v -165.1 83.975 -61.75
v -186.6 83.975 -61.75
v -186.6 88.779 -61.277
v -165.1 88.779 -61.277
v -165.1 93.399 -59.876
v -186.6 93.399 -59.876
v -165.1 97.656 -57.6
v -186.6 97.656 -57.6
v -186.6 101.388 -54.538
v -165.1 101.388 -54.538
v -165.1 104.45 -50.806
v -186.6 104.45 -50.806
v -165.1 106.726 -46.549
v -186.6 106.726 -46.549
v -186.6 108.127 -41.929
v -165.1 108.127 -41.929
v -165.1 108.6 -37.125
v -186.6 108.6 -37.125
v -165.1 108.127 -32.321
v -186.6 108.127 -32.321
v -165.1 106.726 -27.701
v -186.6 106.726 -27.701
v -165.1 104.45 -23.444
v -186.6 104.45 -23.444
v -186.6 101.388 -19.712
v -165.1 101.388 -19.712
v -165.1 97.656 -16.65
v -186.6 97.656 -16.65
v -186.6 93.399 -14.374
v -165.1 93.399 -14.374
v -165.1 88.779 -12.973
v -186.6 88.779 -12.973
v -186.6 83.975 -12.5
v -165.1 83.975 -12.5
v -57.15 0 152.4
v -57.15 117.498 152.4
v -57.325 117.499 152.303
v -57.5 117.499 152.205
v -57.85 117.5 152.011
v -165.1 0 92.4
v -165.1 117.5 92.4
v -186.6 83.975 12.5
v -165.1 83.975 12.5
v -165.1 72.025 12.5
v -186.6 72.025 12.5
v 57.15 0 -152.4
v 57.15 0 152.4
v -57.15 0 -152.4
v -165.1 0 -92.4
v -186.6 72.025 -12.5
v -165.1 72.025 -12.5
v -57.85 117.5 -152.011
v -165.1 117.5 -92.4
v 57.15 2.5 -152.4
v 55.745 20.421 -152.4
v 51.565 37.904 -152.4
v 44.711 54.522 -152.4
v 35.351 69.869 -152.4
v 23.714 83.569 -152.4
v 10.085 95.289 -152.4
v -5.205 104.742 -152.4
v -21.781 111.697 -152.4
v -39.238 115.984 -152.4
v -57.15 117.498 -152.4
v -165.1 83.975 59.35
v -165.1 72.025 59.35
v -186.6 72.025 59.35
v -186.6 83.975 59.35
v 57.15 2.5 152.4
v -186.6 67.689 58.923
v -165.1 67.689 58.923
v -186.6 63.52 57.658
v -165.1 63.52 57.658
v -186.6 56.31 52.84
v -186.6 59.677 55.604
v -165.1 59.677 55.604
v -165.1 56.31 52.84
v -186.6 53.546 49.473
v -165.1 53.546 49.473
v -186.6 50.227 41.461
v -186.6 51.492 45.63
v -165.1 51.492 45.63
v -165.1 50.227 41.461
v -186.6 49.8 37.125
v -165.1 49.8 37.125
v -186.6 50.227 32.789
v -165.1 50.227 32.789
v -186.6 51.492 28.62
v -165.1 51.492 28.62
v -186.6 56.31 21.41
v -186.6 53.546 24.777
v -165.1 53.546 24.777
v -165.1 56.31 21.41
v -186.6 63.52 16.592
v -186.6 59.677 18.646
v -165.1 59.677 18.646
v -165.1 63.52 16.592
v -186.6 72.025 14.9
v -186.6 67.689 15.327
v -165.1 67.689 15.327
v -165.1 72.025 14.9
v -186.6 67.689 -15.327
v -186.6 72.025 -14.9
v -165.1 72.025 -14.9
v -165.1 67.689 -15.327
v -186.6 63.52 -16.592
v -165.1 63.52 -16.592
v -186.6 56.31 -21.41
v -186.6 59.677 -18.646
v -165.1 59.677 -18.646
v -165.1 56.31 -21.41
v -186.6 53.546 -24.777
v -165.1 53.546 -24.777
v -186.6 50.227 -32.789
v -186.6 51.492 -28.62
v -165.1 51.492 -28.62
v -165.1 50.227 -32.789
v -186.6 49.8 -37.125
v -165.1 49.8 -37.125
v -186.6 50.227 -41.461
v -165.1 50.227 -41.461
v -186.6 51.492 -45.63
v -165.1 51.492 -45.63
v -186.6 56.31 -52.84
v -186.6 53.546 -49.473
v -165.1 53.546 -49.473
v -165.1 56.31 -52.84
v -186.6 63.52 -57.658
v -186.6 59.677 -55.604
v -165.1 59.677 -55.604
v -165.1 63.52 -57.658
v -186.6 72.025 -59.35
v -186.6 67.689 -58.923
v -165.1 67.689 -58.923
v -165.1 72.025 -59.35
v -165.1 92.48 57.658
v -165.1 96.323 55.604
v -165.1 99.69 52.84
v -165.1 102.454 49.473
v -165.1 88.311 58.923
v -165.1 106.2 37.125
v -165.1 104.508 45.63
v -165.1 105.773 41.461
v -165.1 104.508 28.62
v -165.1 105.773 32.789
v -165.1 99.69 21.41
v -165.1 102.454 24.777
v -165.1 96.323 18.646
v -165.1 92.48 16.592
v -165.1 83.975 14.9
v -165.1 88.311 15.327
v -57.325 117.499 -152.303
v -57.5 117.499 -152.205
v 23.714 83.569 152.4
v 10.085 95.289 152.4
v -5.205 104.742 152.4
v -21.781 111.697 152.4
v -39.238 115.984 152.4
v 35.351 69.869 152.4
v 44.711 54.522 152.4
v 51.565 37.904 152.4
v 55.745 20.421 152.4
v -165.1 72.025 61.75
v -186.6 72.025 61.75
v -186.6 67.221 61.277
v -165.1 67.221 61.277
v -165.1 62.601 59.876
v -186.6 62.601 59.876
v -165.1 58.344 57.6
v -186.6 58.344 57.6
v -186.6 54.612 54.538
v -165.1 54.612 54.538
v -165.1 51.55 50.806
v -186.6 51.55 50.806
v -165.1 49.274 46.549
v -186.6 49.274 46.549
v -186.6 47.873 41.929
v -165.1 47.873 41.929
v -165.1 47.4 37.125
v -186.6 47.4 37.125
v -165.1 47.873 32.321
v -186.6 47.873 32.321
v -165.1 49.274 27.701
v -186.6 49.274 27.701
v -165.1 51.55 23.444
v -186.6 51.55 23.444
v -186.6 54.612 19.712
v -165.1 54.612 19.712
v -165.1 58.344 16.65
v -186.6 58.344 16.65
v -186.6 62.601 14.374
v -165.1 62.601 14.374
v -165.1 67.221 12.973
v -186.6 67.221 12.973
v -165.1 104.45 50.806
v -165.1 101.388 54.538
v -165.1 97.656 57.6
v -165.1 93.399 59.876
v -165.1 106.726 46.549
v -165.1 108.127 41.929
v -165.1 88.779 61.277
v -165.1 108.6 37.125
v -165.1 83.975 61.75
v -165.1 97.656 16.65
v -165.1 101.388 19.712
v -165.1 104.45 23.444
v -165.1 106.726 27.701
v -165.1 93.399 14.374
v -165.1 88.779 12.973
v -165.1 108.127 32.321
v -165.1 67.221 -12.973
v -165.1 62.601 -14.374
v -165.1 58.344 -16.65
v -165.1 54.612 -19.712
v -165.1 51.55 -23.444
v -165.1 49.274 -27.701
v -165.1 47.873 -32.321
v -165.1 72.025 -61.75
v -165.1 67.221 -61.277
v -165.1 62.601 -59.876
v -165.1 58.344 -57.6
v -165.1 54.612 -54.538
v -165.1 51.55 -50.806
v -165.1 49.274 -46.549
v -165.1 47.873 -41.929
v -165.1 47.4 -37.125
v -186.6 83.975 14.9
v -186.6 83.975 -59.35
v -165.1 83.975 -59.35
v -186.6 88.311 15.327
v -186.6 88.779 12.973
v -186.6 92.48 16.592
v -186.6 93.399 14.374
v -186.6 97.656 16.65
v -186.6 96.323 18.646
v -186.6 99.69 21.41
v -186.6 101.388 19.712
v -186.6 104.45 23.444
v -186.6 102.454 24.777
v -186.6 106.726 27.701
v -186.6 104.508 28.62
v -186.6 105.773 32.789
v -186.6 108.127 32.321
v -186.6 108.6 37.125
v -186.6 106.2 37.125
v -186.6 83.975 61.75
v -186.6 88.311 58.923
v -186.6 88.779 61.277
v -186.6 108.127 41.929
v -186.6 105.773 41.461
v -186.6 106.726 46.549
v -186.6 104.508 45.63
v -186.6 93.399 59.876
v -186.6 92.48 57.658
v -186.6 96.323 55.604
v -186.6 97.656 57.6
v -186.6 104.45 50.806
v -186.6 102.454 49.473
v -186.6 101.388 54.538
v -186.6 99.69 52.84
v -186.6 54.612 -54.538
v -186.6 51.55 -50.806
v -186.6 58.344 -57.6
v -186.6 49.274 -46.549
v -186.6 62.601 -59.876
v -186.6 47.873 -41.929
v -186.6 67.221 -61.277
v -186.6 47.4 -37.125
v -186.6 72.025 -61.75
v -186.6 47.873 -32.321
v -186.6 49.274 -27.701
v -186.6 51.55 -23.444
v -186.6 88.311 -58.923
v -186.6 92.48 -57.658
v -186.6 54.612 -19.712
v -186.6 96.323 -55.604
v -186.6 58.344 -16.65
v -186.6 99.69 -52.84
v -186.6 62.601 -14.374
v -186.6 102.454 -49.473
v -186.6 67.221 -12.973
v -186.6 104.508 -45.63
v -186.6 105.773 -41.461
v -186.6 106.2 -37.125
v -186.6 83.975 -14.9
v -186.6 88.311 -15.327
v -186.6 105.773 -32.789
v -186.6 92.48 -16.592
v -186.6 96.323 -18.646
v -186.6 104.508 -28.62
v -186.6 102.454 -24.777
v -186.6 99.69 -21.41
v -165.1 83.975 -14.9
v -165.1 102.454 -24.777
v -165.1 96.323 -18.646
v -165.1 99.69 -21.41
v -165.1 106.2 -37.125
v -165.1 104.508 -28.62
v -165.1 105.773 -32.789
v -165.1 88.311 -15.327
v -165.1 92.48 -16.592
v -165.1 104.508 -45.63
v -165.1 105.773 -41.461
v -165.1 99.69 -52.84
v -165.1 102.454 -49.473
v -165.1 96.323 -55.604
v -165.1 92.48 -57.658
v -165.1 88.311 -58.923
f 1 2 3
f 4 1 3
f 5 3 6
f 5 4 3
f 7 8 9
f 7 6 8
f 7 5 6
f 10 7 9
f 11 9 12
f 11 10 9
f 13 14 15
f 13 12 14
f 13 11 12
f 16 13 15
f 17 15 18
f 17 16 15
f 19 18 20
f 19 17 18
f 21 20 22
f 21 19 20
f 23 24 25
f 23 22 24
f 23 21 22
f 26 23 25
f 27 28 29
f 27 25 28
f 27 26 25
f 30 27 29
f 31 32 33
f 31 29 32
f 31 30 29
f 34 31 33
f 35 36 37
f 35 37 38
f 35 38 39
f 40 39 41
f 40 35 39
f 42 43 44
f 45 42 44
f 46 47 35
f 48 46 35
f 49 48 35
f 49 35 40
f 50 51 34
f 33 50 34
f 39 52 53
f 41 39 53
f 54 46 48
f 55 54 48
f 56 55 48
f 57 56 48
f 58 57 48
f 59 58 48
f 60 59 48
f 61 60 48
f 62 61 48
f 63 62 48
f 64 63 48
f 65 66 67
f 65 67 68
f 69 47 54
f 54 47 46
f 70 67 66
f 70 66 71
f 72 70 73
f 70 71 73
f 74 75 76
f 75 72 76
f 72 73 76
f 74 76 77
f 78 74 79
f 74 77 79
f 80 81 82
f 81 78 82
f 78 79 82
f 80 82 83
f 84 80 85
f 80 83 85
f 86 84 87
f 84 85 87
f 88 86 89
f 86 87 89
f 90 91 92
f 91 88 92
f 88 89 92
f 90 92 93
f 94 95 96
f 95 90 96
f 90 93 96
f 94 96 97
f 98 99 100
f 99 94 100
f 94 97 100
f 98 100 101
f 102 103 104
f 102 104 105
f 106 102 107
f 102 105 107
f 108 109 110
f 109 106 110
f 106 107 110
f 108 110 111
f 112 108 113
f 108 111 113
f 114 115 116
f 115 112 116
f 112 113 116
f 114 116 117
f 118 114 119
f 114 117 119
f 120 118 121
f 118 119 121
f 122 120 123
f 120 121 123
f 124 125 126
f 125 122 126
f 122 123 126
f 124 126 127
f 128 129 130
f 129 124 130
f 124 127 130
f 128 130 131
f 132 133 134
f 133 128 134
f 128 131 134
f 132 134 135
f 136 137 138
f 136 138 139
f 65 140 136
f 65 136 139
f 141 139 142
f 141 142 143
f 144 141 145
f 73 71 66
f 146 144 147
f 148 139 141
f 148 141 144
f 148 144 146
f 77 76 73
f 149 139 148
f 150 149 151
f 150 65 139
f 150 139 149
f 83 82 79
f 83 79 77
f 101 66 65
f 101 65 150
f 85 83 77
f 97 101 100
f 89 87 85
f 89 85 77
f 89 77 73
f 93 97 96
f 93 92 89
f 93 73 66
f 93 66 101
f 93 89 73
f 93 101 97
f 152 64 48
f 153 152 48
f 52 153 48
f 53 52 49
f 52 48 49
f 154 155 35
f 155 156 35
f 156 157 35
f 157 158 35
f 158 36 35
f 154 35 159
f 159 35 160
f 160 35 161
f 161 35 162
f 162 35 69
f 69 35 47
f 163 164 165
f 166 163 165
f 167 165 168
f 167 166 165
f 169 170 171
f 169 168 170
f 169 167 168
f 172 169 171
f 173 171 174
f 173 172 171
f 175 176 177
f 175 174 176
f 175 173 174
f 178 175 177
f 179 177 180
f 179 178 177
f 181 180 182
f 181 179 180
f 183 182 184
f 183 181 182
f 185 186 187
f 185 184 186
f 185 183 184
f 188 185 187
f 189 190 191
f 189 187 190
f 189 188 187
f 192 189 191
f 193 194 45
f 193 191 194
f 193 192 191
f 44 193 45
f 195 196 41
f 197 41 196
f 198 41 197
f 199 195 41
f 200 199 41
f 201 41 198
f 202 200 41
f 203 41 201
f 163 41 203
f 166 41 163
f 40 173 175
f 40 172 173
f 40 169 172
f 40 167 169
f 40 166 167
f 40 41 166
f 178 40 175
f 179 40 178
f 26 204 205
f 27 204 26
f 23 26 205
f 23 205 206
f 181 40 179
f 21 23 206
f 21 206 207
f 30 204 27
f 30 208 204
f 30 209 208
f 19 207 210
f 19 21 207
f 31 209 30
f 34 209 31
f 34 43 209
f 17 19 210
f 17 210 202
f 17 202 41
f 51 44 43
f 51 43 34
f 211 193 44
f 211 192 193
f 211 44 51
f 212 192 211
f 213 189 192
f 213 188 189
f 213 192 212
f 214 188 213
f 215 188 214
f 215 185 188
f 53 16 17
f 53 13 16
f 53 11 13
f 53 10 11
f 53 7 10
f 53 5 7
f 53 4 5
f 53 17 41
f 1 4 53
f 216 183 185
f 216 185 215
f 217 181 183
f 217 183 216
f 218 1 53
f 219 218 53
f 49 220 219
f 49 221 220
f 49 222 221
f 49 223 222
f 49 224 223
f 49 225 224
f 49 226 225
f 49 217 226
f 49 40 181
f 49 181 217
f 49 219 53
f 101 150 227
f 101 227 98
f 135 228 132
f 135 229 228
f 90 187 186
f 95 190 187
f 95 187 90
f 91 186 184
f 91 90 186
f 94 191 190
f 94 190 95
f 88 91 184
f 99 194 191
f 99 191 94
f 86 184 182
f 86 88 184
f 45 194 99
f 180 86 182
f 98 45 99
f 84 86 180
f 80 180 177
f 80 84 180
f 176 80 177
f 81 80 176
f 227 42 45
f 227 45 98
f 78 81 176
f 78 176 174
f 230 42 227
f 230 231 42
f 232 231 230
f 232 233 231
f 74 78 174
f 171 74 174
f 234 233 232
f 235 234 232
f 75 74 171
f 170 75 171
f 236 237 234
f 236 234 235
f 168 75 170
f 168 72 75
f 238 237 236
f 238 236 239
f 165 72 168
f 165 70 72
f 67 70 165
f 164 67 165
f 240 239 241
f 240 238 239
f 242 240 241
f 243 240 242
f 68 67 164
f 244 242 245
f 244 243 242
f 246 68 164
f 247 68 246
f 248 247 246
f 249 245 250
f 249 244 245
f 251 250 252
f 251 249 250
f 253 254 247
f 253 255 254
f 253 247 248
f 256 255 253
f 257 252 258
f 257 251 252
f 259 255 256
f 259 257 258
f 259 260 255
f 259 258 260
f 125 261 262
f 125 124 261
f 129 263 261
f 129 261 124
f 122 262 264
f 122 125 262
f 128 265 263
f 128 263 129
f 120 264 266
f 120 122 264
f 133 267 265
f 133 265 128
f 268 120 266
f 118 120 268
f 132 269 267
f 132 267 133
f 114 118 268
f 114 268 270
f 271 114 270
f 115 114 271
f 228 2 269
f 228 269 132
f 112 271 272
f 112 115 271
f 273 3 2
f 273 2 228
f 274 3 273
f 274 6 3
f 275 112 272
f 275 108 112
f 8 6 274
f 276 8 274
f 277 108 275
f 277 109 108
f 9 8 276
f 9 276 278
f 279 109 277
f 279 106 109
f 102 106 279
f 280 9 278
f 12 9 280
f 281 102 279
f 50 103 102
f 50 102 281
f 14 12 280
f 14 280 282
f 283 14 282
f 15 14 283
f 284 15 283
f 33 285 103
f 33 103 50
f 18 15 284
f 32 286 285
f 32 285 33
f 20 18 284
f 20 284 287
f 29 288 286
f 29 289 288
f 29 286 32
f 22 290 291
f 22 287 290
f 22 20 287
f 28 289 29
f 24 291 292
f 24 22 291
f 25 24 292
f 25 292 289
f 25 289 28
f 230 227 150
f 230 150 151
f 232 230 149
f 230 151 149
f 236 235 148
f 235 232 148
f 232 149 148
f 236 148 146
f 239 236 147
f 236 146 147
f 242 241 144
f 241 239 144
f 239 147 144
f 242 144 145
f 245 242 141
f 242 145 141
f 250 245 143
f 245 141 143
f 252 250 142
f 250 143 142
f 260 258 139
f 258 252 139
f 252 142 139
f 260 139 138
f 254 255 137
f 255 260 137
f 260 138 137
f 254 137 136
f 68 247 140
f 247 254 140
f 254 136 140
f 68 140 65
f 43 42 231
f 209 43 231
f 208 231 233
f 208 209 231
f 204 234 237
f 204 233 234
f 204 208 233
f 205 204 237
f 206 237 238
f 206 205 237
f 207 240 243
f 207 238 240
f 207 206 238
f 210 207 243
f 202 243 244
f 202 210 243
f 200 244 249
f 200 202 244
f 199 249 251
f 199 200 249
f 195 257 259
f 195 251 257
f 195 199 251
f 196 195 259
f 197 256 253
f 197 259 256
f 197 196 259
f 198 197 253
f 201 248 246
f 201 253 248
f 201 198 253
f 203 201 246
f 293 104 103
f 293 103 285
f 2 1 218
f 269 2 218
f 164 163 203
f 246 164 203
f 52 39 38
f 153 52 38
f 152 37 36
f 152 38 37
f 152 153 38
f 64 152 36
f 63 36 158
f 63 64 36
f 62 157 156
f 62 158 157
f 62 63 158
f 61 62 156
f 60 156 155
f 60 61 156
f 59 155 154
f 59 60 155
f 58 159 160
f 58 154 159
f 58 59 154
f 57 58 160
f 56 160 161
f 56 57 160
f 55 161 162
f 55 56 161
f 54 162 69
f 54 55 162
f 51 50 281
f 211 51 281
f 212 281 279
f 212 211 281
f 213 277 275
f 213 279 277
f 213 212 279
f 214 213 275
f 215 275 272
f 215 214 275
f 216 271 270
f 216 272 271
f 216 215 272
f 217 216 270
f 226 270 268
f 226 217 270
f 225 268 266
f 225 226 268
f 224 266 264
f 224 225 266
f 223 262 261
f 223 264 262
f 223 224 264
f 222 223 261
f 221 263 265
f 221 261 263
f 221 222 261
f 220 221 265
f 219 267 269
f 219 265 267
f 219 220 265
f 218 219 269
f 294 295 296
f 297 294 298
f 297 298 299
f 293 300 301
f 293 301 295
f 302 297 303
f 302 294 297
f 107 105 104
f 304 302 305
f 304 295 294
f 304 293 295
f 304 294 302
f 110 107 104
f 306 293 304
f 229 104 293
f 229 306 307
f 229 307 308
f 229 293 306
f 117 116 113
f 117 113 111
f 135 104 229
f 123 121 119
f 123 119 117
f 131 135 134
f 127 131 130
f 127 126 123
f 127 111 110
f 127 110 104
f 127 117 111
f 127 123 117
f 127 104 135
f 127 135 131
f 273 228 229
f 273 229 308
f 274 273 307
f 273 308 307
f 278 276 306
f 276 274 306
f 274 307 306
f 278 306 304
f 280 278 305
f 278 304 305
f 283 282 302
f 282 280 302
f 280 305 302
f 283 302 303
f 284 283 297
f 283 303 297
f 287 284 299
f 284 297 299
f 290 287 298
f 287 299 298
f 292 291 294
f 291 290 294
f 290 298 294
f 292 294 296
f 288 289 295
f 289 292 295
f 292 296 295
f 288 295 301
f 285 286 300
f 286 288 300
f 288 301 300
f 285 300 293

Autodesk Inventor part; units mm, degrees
ref_plane "YZ Plane" through (0, 0, 0) normal (1, 0, 0) x (0, 1, 0)
ref_plane "XZ Plane" through (0, 0, 0) normal (0, 1, 0) x (-1, 0, 0)
ref_plane "XY Plane" through (0, 0, 0) normal (0, 0, 1) x (1, 0, 0)
sketch "Sketch1" plane through (0, 0, 0) normal (0, 1, 0) x (-1, 0, 0)
  line L0 (57.15, 152.4) -> (-57.15, 152.4)
  line L1 (-57.15, 152.4) -> (-57.15, -152.4)
  line L2 (-57.15, -152.4) -> (57.15, -152.4)
  line L3 (57.15, -152.4) -> (57.15, 152.4)
  line L4 (57.15, 152.4) -> (165.1, 152.4)
  line L5 (165.1, 152.4) -> (165.1, -152.4)
  line L6 (165.1, -152.4) -> (57.15, -152.4)
  line L7 (57.15, -152.4) -> (57.15, 152.4)
  line L8 (57.15, -152.4) -> (57.15, -92.4)
  line L9 (57.15, -92.4) -> (165.1, -92.4)
  line L10 (57.15, -152.4) -> (165.1, -92.4)
  line L11 (57.15, 152.4) -> (57.15, 92.4)
  line L12 (57.15, 92.4) -> (165.1, 92.4)
  line L13 (57.15, 152.4) -> (165.1, 92.4)
  point P0 (0, 0)
  point P1 (57.15, 0)
  point P2 (0, -152.4)
  dimension "d0" = 304.8
  dimension "d1" = 114.3
  dimension "d2" = 107.95
  dimension "d3" = 60
  dimension "d4" = 60
extrude "Extrusion1" add sketch "Sketch1" along normal blind 117.5 contours L3 L2 L1 L0 | L13 L12 L3 | L12 L5 L9 L3 | L9 L10 L3
fillet "Fillet1" radius 115 1 edges at (57.15, 117.5, 0)
sketch "Sketch2" plane through (-165.1, 0, -92.4) normal (-1, 0, 0) x (0, 0, 1)
  line L0 (55.275, 83.975) -> (55.275, 72.025) construction
  line L1 (30.65, 83.975) -> (30.65, 72.025)
  line L2 (79.9, 72.025) -> (79.9, 83.975)
  arc A0 (79.9, 83.975) -> (30.65, 83.975) centre (55.275, 83.975) ccw
  arc A1 (30.65, 72.025) -> (79.9, 72.025) centre (55.275, 72.025) ccw
  line L3 (129.525, 83.975) -> (129.525, 72.025) construction
  line L4 (104.9, 83.975) -> (104.9, 72.025)
  line L5 (154.15, 72.025) -> (154.15, 83.975)
  arc A2 (154.15, 83.975) -> (104.9, 83.975) centre (129.525, 83.975) ccw
  arc A3 (104.9, 72.025) -> (154.15, 72.025) centre (129.525, 72.025) ccw
  line L6 (92.4, 0) -> (92.4, 114.666) construction
  line L7 (0, 117.5) -> (184.8, 117.5) projected
  line L8 (107.3, 83.975) -> (107.3, 72.025)
  arc A4 (107.3, 72.025) -> (151.75, 72.025) centre (129.525, 72.025) ccw
  line L9 (151.75, 72.025) -> (151.75, 83.975)
  arc A5 (151.75, 83.975) -> (107.3, 83.975) centre (129.525, 83.975) ccw
  line L10 (33.05, 83.975) -> (33.05, 72.025)
  arc A6 (33.05, 72.025) -> (77.5, 72.025) centre (55.275, 72.025) ccw
  line L11 (77.5, 72.025) -> (77.5, 83.975)
  arc A7 (77.5, 83.975) -> (33.05, 83.975) centre (55.275, 83.975) ccw
  point P0 (55.275, 78)
  point P1 (129.525, 78)
  point P2 (129.525, 47.4)
  point P3 (129.525, 108.6)
  point P4 (129.525, 106.2)
  point P5 (55.275, 47.4)
  point P6 (55.275, 108.6)
  dimension "d8" = 12.5
  dimension "d9" = 61.2
  dimension "d10" = 49.25
  dimension "d12" = 2.4
  dimension "d14" = 8.9
  dimension "d15" = 12.5
  dimension "d16" = 61.2
  dimension "d17" = 49.25
  dimension "d18" = 8.9
  dimension "d19" = 2.4
extrude "Extrusion2" add sketch "Sketch2" along normal blind 21.5
properties part number "Airbox"
